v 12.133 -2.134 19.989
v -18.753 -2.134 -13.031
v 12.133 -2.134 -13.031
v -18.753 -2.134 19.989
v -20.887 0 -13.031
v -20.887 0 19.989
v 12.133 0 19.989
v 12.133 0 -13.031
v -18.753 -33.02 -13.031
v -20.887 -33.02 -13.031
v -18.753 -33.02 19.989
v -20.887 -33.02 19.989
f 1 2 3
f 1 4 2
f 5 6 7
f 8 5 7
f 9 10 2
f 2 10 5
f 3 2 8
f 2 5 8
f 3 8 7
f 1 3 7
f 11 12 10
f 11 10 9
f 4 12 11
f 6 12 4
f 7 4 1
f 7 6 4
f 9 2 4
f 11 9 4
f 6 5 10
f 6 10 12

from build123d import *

# Parameters (mm, degrees)
F0_W     = 33.02
F0_H     = 33.02
F1_DEPTH = 33.02
F2_T     = -2.1336


with BuildPart() as f1:
    # F0 (on Front) → F1 (new body)
    with BuildSketch(Plane.XZ):
        with Locations((-4.376881, 3.478918)):
            Rectangle(F0_W, F0_H)
    extrude(amount=F1_DEPTH)

    # F2
    f2_openings = [f1.faces().sort_by_distance(p)[0] for p in [
        (-4.376881, -16.51, -13.031082),
        (12.133119, -16.51, 3.478918),
        (-4.376881, -33.02, 3.478918),
        (-4.376881, -16.51, 19.988918),
    ]]
    offset(amount=F2_T, openings=f2_openings)


solid = f1.part
